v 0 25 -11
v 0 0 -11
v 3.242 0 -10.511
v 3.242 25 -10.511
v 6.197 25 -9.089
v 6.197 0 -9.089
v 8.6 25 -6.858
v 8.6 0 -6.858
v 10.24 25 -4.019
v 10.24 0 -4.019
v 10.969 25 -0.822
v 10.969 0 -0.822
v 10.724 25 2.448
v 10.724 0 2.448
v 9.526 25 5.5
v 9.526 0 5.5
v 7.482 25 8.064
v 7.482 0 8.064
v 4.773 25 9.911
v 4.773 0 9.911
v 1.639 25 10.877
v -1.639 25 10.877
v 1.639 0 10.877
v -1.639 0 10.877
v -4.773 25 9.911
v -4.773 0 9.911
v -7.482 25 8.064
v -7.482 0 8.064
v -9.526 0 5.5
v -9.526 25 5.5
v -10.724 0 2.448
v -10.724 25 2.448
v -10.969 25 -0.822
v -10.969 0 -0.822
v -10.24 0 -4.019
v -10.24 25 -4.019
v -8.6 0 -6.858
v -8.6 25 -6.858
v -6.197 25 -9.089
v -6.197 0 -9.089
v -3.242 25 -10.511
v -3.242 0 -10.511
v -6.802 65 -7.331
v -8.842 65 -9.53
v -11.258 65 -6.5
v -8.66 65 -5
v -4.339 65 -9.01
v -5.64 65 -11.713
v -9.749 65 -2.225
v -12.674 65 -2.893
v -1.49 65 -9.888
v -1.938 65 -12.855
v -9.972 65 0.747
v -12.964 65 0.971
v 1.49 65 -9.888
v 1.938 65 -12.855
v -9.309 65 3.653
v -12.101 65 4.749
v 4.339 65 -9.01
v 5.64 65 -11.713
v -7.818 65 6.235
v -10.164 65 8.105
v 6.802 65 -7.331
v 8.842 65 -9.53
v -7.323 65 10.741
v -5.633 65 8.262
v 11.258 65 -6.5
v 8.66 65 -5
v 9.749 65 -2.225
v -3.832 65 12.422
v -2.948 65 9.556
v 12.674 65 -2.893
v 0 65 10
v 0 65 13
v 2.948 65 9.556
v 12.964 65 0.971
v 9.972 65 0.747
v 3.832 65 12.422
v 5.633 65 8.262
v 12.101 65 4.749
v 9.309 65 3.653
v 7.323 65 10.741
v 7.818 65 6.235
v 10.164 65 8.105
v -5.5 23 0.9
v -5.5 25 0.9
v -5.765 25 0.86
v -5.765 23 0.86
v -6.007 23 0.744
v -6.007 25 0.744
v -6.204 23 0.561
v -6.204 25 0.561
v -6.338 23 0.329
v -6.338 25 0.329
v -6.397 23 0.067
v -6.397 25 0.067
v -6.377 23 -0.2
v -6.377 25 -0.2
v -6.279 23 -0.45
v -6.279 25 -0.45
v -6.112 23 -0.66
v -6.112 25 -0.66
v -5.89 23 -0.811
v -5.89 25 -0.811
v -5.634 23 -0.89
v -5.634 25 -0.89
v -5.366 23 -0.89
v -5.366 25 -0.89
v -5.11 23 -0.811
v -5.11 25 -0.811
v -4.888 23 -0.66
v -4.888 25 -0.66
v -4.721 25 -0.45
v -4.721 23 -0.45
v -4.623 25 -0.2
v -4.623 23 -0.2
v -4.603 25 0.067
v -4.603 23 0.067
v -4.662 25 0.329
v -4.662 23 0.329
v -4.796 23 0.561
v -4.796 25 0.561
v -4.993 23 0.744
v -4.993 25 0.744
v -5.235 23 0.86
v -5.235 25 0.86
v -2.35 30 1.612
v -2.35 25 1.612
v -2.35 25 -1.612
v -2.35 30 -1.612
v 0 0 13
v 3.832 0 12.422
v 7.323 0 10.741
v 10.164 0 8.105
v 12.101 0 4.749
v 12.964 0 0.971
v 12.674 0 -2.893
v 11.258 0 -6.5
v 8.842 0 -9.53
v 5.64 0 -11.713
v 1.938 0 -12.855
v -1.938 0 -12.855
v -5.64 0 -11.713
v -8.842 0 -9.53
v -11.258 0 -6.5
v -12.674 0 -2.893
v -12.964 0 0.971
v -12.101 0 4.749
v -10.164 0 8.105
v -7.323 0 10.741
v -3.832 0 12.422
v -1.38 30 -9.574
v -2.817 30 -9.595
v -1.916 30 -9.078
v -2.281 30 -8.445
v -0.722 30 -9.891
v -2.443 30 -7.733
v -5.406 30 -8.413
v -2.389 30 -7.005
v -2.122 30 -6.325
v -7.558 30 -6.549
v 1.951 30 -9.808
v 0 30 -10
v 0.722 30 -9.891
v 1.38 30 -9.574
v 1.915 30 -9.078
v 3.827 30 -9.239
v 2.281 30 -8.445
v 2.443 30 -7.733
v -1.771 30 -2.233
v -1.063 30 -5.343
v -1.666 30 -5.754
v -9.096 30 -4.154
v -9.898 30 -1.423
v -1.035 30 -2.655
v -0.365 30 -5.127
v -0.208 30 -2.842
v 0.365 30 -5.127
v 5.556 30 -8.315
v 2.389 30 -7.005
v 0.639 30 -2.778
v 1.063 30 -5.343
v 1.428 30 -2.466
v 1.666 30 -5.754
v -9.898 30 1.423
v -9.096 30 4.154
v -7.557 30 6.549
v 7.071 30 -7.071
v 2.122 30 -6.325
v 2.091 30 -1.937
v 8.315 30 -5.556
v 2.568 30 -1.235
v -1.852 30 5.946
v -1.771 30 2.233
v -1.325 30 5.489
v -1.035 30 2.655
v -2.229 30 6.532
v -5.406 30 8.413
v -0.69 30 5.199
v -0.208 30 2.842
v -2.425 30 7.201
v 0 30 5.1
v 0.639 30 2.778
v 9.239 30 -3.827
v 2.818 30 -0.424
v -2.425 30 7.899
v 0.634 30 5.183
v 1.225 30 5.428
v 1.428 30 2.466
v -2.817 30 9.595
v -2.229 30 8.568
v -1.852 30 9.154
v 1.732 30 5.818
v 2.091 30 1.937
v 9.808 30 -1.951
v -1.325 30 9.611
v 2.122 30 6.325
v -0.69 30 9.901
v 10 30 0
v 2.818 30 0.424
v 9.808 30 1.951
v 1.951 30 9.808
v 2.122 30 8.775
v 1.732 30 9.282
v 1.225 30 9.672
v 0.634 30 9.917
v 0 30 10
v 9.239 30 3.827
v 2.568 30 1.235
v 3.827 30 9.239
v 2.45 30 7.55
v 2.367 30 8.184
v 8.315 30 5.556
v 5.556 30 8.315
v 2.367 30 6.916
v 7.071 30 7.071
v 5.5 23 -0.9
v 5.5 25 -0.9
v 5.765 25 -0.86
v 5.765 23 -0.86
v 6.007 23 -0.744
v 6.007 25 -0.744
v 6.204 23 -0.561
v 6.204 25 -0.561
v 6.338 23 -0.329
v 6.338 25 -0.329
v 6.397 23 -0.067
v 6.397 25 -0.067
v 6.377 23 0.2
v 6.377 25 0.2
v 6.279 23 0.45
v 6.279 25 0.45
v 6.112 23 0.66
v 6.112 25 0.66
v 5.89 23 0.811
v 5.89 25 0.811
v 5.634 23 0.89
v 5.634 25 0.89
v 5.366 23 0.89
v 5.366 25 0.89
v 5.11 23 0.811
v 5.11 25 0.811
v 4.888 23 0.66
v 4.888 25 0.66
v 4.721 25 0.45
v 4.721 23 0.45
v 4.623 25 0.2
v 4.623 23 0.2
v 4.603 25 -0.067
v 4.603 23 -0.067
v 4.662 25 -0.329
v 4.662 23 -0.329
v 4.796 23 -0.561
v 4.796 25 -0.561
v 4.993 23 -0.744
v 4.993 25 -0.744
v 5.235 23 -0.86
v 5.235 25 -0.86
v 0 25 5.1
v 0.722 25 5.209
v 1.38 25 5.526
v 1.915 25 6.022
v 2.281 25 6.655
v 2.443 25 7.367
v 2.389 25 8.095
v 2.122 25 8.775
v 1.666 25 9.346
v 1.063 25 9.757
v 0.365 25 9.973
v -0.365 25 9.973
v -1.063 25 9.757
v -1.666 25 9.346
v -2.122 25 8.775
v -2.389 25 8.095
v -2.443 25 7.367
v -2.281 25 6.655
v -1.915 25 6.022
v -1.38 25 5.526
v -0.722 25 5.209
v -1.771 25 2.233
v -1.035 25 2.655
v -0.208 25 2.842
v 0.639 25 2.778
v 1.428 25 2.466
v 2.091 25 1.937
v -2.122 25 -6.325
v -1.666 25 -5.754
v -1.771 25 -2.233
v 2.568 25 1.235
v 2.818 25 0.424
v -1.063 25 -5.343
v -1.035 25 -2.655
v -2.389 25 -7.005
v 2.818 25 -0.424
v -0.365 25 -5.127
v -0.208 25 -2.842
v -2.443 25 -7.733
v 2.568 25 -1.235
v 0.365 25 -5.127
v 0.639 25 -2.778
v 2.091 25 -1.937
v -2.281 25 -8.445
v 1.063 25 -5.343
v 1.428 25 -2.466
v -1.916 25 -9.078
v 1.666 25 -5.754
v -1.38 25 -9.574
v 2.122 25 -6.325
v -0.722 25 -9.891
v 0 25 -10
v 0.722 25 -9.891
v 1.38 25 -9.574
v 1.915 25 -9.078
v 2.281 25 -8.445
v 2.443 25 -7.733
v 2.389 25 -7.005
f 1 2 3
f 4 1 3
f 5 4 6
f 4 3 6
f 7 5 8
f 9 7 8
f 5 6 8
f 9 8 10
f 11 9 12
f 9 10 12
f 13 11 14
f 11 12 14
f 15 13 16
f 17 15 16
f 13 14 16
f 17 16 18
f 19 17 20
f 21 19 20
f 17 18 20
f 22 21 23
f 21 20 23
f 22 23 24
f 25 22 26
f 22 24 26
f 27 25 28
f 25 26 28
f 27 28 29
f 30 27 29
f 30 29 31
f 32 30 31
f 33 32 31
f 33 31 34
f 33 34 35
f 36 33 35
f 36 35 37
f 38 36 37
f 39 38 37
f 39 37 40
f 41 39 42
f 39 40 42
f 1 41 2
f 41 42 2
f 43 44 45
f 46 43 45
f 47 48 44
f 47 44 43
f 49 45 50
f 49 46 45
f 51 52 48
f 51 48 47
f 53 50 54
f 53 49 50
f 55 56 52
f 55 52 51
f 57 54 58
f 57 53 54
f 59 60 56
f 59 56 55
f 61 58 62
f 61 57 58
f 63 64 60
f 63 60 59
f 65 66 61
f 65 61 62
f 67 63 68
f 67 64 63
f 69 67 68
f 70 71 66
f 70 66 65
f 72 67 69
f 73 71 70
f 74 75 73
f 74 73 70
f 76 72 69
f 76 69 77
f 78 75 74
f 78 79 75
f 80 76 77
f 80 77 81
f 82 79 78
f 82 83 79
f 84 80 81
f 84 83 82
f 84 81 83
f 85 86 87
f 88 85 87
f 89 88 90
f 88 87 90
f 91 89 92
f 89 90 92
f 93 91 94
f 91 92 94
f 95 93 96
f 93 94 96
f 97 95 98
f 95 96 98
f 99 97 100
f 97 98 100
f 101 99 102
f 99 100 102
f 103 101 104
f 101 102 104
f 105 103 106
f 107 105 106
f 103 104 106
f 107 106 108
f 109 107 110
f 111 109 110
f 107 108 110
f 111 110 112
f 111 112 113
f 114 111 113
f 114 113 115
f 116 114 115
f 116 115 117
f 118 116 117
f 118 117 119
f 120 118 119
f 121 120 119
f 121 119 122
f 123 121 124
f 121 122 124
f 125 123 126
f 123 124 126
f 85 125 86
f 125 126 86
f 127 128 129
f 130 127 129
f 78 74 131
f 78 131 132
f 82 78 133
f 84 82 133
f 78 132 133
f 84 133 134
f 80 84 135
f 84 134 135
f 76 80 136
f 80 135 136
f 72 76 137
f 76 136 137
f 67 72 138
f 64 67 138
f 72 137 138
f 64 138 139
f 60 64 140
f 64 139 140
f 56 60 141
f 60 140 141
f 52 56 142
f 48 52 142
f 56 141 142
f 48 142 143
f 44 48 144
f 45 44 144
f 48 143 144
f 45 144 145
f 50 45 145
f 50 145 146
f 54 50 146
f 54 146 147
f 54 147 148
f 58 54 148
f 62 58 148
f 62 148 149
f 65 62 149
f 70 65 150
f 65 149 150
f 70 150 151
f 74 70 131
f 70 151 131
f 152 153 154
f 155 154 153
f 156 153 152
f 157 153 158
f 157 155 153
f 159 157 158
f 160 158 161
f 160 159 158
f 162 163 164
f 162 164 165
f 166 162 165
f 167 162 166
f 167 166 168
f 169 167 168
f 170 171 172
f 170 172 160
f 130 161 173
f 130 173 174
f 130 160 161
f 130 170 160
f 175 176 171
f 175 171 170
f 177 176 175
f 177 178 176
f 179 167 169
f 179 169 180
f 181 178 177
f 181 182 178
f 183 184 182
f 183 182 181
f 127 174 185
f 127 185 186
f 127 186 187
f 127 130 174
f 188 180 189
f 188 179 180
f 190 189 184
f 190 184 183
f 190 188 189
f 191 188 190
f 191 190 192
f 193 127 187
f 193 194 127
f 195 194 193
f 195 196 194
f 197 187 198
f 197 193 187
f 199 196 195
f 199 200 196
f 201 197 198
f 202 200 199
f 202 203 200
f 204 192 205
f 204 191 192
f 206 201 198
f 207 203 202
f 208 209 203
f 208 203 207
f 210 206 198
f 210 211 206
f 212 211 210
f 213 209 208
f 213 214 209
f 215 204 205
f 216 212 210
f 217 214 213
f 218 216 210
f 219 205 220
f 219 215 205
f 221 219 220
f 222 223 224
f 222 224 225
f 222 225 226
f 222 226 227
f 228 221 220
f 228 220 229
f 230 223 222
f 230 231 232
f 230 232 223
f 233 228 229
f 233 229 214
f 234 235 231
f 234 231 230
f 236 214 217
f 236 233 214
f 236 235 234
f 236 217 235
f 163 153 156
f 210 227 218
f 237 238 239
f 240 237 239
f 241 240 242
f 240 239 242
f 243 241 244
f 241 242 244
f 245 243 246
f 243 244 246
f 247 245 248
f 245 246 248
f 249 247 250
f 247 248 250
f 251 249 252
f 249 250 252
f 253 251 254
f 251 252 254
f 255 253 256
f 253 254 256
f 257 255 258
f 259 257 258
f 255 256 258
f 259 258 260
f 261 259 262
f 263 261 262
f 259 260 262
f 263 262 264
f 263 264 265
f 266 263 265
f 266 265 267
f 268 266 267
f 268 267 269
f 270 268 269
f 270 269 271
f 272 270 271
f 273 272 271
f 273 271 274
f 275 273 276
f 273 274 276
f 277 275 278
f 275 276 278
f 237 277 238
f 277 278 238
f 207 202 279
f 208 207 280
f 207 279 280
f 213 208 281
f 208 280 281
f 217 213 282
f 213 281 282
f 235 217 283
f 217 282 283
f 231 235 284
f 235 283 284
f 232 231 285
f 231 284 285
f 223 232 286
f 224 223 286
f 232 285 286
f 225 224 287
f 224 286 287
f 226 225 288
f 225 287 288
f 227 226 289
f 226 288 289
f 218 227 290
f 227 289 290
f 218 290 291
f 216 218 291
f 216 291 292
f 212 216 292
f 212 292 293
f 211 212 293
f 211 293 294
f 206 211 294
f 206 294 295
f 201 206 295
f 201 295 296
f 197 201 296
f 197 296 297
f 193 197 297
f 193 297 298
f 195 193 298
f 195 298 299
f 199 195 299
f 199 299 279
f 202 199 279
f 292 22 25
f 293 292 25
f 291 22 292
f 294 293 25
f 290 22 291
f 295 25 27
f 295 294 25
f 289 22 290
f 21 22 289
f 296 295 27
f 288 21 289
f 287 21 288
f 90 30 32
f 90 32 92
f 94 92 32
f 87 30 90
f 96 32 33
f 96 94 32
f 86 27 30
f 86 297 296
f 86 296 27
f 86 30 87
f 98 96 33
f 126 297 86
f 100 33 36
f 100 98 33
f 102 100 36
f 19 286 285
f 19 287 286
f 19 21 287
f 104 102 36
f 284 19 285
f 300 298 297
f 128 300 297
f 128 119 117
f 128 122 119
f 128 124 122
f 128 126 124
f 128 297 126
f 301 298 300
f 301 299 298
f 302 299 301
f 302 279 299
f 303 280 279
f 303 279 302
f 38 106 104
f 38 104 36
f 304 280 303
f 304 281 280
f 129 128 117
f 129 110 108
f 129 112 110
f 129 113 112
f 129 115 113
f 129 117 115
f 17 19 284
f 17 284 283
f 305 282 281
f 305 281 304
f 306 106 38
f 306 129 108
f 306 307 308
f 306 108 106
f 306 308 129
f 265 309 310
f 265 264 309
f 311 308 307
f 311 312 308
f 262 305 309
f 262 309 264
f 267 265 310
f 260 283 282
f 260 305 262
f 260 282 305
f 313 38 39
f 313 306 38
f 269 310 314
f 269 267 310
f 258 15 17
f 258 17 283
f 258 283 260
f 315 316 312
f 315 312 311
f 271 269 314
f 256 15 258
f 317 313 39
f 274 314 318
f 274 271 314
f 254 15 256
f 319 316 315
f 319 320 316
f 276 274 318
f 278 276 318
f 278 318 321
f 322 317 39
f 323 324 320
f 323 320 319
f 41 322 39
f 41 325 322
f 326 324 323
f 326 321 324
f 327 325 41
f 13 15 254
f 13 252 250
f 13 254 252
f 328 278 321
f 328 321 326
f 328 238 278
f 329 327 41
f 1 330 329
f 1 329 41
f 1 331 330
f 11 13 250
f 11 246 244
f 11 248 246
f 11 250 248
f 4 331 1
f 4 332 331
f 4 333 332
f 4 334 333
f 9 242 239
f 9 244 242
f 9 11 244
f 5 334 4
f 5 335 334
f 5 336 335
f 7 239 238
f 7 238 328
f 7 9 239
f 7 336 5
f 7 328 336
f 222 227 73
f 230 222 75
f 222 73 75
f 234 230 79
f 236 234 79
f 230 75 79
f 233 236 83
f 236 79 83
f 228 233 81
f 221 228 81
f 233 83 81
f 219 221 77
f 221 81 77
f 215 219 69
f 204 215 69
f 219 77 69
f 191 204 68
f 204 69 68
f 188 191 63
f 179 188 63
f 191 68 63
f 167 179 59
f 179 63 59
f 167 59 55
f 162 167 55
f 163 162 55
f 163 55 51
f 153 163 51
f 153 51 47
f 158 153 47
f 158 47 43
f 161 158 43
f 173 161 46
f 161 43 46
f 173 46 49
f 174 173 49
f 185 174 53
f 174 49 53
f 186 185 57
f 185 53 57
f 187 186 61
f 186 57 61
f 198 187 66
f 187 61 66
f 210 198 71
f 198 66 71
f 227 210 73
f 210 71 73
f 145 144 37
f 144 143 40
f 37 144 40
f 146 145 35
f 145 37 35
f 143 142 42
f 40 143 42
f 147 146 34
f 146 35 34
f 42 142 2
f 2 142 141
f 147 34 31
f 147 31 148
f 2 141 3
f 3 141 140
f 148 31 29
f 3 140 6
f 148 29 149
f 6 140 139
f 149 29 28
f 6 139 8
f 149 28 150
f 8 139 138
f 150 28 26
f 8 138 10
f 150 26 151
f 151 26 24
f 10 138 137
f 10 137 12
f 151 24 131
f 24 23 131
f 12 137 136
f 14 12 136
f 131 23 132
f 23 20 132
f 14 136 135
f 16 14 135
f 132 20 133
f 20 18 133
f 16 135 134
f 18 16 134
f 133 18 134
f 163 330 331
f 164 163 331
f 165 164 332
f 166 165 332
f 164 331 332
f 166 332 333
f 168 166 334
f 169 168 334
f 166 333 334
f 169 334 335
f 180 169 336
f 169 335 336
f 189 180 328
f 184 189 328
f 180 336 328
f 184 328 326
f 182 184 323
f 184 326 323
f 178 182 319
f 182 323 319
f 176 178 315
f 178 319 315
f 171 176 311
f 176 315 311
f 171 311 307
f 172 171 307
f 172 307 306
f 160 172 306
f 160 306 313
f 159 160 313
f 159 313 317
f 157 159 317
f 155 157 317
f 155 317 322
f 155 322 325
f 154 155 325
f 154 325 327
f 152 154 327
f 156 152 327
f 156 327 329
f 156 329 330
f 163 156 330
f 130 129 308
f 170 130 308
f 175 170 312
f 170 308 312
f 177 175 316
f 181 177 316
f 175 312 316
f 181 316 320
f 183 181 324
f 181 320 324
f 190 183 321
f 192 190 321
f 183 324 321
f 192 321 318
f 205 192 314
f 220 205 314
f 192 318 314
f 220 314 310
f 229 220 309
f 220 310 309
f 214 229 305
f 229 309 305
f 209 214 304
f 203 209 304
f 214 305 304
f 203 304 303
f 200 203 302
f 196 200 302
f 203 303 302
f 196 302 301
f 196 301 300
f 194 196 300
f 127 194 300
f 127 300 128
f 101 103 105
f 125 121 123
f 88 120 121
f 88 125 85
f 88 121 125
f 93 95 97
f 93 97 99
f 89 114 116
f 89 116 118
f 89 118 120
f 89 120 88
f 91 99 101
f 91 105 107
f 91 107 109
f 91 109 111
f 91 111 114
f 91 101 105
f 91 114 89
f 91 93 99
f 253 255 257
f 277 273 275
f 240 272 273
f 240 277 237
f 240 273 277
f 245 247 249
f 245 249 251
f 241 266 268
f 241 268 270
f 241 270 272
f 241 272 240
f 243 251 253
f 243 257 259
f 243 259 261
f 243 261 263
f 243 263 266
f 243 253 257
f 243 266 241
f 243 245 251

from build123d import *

# Parameters (mm, degrees)
BUITENCIRKEL_R                    = 13
CILINDER_BASIS_DEPTH              = 65
BINNENCIRKEL_MOTOR_R              = 11
HOLTE_MOTOR_DEPTH                 = 25
BINNENCIRKEL_BUIS_R               = 10
HOLTE_BUIS_DEPTH                  = 35
UITSPARING_MOTORAS_DEPTH          = 45.022721406
CIRKEL_MOTORPINNETJES_R           = 0.9
UITSPARINGEN_MOTORPINNETJES_DEPTH = 2
CIRKEL_POLEN_R                    = 2.45
UITSPARINGEN_MOTORPOLEN_DEPTH     = 45.022721406


with BuildPart() as part:
    # Buitencirkel → Cilinder basis (new body)
    with BuildSketch(Plane(origin=(0, 0, 0), x_dir=(1, 0, 0), z_dir=(0, 1, 0))):
        with Locations(Location((0, 0, 0), (0, 0, 270))):
            Circle(BUITENCIRKEL_R)
    extrude(amount=CILINDER_BASIS_DEPTH)

    # Binnencirkel motor → Holte motor (cut)
    with BuildSketch(Plane(origin=(0, 0, 0), x_dir=(-1, 0, 0), z_dir=(0, -1, 0))):
        with Locations(Location((0, 0, 0), (0, 0, 90))):
            Circle(BINNENCIRKEL_MOTOR_R)
    extrude(amount=-HOLTE_MOTOR_DEPTH, mode=Mode.SUBTRACT)

    # Binnencirkel buis → Holte buis (cut)
    with BuildSketch(Plane(origin=(0, 65, 0), x_dir=(1, 0, 0), z_dir=(0, 1, 0))):
        with Locations(Location((0, 0, 0), (0, 0, 270))):
            Circle(BINNENCIRKEL_BUIS_R)
    extrude(amount=-HOLTE_BUIS_DEPTH, mode=Mode.SUBTRACT)

    # Cirkel motoras → Uitsparing motoras (cut, through all)
    with BuildSketch(Plane(origin=(0, 25, 0), x_dir=(-1, 0, 0), z_dir=(0, -1, 0))):
        with BuildLine():
            Line((2.35, -1.61245155), (2.35, 1.61245155))
            ThreePointArc((2.35, 1.61245155), (-2.85, 0), (2.35, -1.61245155))
        make_face()
    extrude(amount=-UITSPARING_MOTORAS_DEPTH, mode=Mode.SUBTRACT)

    # Cirkel motorpinnetjes → Uitsparingen motorpinnetjes (add)
    with BuildSketch(Plane(origin=(0, 25, 0), x_dir=(-1, 0, 0), z_dir=(0, -1, 0))):
        with Locations(Location((-5.5, 0, 0), (0, 0, 90))):
            Circle(CIRKEL_MOTORPINNETJES_R)
        with Locations(Location((5.5, 0, 0), (0, 0, 270))):
            Circle(CIRKEL_MOTORPINNETJES_R)
    extrude(amount=UITSPARINGEN_MOTORPINNETJES_DEPTH)

    # Cirkel polen → Uitsparingen motorpolen (cut, through all)
    with BuildSketch(Plane(origin=(0, 25, 0), x_dir=(-1, 0, 0), z_dir=(0, -1, 0))):
        with Locations(Location((0, -7.55, 0), (0, 0, 90))):
            Circle(CIRKEL_POLEN_R)
        with Locations(Location((0, 7.55, 0), (0, 0, 89.999404226))):
            Circle(CIRKEL_POLEN_R)
    extrude(amount=-UITSPARINGEN_MOTORPOLEN_DEPTH, mode=Mode.SUBTRACT)


solid = part.part
